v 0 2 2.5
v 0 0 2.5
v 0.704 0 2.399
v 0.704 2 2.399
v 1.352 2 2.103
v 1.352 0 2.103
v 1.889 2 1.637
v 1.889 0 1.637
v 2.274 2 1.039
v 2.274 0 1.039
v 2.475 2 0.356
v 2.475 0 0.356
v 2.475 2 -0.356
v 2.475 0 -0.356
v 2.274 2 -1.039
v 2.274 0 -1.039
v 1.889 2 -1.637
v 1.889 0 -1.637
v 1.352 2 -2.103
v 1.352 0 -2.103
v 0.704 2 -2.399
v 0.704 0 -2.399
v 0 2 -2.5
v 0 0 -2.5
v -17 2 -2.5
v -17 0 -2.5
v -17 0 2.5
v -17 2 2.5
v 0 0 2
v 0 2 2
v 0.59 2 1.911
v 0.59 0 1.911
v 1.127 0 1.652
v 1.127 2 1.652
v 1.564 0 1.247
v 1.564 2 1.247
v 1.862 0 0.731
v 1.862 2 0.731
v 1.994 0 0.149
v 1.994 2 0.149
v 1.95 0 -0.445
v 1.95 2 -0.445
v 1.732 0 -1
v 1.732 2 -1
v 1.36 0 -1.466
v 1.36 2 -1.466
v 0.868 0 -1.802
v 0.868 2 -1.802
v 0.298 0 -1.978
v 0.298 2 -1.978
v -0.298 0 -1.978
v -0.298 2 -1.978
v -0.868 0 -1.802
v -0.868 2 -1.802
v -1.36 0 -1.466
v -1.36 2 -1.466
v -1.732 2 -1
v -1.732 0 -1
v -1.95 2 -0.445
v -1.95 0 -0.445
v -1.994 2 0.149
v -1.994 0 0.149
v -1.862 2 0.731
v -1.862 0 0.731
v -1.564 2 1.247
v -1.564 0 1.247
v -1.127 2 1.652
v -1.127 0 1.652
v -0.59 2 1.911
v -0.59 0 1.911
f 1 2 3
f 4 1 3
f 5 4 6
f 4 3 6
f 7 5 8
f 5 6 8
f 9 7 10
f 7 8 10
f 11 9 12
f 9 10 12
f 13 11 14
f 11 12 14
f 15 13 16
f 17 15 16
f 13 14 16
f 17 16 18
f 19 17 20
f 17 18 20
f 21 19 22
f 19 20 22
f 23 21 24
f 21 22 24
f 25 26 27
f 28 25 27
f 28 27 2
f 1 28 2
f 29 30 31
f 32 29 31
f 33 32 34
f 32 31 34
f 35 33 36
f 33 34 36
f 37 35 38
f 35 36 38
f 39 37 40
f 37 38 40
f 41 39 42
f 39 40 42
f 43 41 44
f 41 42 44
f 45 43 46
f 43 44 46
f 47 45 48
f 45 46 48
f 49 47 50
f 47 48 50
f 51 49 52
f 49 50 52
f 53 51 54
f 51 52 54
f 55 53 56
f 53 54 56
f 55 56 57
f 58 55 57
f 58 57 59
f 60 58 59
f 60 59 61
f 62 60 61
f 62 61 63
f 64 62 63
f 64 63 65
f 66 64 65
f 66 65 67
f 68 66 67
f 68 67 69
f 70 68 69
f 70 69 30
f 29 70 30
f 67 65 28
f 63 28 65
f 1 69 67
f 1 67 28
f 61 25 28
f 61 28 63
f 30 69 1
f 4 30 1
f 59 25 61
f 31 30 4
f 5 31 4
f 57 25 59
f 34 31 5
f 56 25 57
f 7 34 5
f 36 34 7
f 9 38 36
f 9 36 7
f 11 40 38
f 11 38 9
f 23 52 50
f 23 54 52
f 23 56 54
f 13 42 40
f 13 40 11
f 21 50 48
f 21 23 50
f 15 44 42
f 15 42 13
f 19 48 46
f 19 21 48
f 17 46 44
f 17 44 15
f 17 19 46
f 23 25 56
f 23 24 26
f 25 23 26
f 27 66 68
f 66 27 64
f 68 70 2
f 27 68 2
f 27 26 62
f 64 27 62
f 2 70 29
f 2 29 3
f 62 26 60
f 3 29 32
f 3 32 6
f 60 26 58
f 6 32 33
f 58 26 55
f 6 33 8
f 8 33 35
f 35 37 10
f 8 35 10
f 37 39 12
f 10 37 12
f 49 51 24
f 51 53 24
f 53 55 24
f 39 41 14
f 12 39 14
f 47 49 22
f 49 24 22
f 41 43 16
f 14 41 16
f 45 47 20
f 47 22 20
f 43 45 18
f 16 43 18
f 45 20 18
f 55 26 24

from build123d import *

# Parameters (mm, degrees)
EXTRUDE_1_DEPTH     = 2
SKETCH_2_R          = 2
CUT_EXTRUDE_1_DEPTH = 3


with BuildPart() as part:
    # Эскиз1 → Бобышка-Вытянуть1 (new body)
    with BuildSketch(Plane(origin=(0, 0, 0), x_dir=(1, 0, 0), z_dir=(0, 1, 0))):
        with BuildLine():
            Line((0, 2.5), (-17, 2.5))
            Line((-17, 2.5), (-17, -2.5))
            Line((-17, -2.5), (0, -2.5))
            ThreePointArc((0, -2.5), (2.5, 0), (0, 2.5))
        make_face()
    extrude(amount=EXTRUDE_1_DEPTH)

    # Эскиз2 → Вырез-Вытянуть1 (cut)
    with BuildSketch(Plane(origin=(0, 2, 0), x_dir=(1, 0, 0), z_dir=(0, 1, 0))):
        with Locations(Location((0, 0, 0), (0, 0, 270))):
            Circle(SKETCH_2_R)
    extrude(amount=-CUT_EXTRUDE_1_DEPTH, mode=Mode.SUBTRACT)


solid = part.part
